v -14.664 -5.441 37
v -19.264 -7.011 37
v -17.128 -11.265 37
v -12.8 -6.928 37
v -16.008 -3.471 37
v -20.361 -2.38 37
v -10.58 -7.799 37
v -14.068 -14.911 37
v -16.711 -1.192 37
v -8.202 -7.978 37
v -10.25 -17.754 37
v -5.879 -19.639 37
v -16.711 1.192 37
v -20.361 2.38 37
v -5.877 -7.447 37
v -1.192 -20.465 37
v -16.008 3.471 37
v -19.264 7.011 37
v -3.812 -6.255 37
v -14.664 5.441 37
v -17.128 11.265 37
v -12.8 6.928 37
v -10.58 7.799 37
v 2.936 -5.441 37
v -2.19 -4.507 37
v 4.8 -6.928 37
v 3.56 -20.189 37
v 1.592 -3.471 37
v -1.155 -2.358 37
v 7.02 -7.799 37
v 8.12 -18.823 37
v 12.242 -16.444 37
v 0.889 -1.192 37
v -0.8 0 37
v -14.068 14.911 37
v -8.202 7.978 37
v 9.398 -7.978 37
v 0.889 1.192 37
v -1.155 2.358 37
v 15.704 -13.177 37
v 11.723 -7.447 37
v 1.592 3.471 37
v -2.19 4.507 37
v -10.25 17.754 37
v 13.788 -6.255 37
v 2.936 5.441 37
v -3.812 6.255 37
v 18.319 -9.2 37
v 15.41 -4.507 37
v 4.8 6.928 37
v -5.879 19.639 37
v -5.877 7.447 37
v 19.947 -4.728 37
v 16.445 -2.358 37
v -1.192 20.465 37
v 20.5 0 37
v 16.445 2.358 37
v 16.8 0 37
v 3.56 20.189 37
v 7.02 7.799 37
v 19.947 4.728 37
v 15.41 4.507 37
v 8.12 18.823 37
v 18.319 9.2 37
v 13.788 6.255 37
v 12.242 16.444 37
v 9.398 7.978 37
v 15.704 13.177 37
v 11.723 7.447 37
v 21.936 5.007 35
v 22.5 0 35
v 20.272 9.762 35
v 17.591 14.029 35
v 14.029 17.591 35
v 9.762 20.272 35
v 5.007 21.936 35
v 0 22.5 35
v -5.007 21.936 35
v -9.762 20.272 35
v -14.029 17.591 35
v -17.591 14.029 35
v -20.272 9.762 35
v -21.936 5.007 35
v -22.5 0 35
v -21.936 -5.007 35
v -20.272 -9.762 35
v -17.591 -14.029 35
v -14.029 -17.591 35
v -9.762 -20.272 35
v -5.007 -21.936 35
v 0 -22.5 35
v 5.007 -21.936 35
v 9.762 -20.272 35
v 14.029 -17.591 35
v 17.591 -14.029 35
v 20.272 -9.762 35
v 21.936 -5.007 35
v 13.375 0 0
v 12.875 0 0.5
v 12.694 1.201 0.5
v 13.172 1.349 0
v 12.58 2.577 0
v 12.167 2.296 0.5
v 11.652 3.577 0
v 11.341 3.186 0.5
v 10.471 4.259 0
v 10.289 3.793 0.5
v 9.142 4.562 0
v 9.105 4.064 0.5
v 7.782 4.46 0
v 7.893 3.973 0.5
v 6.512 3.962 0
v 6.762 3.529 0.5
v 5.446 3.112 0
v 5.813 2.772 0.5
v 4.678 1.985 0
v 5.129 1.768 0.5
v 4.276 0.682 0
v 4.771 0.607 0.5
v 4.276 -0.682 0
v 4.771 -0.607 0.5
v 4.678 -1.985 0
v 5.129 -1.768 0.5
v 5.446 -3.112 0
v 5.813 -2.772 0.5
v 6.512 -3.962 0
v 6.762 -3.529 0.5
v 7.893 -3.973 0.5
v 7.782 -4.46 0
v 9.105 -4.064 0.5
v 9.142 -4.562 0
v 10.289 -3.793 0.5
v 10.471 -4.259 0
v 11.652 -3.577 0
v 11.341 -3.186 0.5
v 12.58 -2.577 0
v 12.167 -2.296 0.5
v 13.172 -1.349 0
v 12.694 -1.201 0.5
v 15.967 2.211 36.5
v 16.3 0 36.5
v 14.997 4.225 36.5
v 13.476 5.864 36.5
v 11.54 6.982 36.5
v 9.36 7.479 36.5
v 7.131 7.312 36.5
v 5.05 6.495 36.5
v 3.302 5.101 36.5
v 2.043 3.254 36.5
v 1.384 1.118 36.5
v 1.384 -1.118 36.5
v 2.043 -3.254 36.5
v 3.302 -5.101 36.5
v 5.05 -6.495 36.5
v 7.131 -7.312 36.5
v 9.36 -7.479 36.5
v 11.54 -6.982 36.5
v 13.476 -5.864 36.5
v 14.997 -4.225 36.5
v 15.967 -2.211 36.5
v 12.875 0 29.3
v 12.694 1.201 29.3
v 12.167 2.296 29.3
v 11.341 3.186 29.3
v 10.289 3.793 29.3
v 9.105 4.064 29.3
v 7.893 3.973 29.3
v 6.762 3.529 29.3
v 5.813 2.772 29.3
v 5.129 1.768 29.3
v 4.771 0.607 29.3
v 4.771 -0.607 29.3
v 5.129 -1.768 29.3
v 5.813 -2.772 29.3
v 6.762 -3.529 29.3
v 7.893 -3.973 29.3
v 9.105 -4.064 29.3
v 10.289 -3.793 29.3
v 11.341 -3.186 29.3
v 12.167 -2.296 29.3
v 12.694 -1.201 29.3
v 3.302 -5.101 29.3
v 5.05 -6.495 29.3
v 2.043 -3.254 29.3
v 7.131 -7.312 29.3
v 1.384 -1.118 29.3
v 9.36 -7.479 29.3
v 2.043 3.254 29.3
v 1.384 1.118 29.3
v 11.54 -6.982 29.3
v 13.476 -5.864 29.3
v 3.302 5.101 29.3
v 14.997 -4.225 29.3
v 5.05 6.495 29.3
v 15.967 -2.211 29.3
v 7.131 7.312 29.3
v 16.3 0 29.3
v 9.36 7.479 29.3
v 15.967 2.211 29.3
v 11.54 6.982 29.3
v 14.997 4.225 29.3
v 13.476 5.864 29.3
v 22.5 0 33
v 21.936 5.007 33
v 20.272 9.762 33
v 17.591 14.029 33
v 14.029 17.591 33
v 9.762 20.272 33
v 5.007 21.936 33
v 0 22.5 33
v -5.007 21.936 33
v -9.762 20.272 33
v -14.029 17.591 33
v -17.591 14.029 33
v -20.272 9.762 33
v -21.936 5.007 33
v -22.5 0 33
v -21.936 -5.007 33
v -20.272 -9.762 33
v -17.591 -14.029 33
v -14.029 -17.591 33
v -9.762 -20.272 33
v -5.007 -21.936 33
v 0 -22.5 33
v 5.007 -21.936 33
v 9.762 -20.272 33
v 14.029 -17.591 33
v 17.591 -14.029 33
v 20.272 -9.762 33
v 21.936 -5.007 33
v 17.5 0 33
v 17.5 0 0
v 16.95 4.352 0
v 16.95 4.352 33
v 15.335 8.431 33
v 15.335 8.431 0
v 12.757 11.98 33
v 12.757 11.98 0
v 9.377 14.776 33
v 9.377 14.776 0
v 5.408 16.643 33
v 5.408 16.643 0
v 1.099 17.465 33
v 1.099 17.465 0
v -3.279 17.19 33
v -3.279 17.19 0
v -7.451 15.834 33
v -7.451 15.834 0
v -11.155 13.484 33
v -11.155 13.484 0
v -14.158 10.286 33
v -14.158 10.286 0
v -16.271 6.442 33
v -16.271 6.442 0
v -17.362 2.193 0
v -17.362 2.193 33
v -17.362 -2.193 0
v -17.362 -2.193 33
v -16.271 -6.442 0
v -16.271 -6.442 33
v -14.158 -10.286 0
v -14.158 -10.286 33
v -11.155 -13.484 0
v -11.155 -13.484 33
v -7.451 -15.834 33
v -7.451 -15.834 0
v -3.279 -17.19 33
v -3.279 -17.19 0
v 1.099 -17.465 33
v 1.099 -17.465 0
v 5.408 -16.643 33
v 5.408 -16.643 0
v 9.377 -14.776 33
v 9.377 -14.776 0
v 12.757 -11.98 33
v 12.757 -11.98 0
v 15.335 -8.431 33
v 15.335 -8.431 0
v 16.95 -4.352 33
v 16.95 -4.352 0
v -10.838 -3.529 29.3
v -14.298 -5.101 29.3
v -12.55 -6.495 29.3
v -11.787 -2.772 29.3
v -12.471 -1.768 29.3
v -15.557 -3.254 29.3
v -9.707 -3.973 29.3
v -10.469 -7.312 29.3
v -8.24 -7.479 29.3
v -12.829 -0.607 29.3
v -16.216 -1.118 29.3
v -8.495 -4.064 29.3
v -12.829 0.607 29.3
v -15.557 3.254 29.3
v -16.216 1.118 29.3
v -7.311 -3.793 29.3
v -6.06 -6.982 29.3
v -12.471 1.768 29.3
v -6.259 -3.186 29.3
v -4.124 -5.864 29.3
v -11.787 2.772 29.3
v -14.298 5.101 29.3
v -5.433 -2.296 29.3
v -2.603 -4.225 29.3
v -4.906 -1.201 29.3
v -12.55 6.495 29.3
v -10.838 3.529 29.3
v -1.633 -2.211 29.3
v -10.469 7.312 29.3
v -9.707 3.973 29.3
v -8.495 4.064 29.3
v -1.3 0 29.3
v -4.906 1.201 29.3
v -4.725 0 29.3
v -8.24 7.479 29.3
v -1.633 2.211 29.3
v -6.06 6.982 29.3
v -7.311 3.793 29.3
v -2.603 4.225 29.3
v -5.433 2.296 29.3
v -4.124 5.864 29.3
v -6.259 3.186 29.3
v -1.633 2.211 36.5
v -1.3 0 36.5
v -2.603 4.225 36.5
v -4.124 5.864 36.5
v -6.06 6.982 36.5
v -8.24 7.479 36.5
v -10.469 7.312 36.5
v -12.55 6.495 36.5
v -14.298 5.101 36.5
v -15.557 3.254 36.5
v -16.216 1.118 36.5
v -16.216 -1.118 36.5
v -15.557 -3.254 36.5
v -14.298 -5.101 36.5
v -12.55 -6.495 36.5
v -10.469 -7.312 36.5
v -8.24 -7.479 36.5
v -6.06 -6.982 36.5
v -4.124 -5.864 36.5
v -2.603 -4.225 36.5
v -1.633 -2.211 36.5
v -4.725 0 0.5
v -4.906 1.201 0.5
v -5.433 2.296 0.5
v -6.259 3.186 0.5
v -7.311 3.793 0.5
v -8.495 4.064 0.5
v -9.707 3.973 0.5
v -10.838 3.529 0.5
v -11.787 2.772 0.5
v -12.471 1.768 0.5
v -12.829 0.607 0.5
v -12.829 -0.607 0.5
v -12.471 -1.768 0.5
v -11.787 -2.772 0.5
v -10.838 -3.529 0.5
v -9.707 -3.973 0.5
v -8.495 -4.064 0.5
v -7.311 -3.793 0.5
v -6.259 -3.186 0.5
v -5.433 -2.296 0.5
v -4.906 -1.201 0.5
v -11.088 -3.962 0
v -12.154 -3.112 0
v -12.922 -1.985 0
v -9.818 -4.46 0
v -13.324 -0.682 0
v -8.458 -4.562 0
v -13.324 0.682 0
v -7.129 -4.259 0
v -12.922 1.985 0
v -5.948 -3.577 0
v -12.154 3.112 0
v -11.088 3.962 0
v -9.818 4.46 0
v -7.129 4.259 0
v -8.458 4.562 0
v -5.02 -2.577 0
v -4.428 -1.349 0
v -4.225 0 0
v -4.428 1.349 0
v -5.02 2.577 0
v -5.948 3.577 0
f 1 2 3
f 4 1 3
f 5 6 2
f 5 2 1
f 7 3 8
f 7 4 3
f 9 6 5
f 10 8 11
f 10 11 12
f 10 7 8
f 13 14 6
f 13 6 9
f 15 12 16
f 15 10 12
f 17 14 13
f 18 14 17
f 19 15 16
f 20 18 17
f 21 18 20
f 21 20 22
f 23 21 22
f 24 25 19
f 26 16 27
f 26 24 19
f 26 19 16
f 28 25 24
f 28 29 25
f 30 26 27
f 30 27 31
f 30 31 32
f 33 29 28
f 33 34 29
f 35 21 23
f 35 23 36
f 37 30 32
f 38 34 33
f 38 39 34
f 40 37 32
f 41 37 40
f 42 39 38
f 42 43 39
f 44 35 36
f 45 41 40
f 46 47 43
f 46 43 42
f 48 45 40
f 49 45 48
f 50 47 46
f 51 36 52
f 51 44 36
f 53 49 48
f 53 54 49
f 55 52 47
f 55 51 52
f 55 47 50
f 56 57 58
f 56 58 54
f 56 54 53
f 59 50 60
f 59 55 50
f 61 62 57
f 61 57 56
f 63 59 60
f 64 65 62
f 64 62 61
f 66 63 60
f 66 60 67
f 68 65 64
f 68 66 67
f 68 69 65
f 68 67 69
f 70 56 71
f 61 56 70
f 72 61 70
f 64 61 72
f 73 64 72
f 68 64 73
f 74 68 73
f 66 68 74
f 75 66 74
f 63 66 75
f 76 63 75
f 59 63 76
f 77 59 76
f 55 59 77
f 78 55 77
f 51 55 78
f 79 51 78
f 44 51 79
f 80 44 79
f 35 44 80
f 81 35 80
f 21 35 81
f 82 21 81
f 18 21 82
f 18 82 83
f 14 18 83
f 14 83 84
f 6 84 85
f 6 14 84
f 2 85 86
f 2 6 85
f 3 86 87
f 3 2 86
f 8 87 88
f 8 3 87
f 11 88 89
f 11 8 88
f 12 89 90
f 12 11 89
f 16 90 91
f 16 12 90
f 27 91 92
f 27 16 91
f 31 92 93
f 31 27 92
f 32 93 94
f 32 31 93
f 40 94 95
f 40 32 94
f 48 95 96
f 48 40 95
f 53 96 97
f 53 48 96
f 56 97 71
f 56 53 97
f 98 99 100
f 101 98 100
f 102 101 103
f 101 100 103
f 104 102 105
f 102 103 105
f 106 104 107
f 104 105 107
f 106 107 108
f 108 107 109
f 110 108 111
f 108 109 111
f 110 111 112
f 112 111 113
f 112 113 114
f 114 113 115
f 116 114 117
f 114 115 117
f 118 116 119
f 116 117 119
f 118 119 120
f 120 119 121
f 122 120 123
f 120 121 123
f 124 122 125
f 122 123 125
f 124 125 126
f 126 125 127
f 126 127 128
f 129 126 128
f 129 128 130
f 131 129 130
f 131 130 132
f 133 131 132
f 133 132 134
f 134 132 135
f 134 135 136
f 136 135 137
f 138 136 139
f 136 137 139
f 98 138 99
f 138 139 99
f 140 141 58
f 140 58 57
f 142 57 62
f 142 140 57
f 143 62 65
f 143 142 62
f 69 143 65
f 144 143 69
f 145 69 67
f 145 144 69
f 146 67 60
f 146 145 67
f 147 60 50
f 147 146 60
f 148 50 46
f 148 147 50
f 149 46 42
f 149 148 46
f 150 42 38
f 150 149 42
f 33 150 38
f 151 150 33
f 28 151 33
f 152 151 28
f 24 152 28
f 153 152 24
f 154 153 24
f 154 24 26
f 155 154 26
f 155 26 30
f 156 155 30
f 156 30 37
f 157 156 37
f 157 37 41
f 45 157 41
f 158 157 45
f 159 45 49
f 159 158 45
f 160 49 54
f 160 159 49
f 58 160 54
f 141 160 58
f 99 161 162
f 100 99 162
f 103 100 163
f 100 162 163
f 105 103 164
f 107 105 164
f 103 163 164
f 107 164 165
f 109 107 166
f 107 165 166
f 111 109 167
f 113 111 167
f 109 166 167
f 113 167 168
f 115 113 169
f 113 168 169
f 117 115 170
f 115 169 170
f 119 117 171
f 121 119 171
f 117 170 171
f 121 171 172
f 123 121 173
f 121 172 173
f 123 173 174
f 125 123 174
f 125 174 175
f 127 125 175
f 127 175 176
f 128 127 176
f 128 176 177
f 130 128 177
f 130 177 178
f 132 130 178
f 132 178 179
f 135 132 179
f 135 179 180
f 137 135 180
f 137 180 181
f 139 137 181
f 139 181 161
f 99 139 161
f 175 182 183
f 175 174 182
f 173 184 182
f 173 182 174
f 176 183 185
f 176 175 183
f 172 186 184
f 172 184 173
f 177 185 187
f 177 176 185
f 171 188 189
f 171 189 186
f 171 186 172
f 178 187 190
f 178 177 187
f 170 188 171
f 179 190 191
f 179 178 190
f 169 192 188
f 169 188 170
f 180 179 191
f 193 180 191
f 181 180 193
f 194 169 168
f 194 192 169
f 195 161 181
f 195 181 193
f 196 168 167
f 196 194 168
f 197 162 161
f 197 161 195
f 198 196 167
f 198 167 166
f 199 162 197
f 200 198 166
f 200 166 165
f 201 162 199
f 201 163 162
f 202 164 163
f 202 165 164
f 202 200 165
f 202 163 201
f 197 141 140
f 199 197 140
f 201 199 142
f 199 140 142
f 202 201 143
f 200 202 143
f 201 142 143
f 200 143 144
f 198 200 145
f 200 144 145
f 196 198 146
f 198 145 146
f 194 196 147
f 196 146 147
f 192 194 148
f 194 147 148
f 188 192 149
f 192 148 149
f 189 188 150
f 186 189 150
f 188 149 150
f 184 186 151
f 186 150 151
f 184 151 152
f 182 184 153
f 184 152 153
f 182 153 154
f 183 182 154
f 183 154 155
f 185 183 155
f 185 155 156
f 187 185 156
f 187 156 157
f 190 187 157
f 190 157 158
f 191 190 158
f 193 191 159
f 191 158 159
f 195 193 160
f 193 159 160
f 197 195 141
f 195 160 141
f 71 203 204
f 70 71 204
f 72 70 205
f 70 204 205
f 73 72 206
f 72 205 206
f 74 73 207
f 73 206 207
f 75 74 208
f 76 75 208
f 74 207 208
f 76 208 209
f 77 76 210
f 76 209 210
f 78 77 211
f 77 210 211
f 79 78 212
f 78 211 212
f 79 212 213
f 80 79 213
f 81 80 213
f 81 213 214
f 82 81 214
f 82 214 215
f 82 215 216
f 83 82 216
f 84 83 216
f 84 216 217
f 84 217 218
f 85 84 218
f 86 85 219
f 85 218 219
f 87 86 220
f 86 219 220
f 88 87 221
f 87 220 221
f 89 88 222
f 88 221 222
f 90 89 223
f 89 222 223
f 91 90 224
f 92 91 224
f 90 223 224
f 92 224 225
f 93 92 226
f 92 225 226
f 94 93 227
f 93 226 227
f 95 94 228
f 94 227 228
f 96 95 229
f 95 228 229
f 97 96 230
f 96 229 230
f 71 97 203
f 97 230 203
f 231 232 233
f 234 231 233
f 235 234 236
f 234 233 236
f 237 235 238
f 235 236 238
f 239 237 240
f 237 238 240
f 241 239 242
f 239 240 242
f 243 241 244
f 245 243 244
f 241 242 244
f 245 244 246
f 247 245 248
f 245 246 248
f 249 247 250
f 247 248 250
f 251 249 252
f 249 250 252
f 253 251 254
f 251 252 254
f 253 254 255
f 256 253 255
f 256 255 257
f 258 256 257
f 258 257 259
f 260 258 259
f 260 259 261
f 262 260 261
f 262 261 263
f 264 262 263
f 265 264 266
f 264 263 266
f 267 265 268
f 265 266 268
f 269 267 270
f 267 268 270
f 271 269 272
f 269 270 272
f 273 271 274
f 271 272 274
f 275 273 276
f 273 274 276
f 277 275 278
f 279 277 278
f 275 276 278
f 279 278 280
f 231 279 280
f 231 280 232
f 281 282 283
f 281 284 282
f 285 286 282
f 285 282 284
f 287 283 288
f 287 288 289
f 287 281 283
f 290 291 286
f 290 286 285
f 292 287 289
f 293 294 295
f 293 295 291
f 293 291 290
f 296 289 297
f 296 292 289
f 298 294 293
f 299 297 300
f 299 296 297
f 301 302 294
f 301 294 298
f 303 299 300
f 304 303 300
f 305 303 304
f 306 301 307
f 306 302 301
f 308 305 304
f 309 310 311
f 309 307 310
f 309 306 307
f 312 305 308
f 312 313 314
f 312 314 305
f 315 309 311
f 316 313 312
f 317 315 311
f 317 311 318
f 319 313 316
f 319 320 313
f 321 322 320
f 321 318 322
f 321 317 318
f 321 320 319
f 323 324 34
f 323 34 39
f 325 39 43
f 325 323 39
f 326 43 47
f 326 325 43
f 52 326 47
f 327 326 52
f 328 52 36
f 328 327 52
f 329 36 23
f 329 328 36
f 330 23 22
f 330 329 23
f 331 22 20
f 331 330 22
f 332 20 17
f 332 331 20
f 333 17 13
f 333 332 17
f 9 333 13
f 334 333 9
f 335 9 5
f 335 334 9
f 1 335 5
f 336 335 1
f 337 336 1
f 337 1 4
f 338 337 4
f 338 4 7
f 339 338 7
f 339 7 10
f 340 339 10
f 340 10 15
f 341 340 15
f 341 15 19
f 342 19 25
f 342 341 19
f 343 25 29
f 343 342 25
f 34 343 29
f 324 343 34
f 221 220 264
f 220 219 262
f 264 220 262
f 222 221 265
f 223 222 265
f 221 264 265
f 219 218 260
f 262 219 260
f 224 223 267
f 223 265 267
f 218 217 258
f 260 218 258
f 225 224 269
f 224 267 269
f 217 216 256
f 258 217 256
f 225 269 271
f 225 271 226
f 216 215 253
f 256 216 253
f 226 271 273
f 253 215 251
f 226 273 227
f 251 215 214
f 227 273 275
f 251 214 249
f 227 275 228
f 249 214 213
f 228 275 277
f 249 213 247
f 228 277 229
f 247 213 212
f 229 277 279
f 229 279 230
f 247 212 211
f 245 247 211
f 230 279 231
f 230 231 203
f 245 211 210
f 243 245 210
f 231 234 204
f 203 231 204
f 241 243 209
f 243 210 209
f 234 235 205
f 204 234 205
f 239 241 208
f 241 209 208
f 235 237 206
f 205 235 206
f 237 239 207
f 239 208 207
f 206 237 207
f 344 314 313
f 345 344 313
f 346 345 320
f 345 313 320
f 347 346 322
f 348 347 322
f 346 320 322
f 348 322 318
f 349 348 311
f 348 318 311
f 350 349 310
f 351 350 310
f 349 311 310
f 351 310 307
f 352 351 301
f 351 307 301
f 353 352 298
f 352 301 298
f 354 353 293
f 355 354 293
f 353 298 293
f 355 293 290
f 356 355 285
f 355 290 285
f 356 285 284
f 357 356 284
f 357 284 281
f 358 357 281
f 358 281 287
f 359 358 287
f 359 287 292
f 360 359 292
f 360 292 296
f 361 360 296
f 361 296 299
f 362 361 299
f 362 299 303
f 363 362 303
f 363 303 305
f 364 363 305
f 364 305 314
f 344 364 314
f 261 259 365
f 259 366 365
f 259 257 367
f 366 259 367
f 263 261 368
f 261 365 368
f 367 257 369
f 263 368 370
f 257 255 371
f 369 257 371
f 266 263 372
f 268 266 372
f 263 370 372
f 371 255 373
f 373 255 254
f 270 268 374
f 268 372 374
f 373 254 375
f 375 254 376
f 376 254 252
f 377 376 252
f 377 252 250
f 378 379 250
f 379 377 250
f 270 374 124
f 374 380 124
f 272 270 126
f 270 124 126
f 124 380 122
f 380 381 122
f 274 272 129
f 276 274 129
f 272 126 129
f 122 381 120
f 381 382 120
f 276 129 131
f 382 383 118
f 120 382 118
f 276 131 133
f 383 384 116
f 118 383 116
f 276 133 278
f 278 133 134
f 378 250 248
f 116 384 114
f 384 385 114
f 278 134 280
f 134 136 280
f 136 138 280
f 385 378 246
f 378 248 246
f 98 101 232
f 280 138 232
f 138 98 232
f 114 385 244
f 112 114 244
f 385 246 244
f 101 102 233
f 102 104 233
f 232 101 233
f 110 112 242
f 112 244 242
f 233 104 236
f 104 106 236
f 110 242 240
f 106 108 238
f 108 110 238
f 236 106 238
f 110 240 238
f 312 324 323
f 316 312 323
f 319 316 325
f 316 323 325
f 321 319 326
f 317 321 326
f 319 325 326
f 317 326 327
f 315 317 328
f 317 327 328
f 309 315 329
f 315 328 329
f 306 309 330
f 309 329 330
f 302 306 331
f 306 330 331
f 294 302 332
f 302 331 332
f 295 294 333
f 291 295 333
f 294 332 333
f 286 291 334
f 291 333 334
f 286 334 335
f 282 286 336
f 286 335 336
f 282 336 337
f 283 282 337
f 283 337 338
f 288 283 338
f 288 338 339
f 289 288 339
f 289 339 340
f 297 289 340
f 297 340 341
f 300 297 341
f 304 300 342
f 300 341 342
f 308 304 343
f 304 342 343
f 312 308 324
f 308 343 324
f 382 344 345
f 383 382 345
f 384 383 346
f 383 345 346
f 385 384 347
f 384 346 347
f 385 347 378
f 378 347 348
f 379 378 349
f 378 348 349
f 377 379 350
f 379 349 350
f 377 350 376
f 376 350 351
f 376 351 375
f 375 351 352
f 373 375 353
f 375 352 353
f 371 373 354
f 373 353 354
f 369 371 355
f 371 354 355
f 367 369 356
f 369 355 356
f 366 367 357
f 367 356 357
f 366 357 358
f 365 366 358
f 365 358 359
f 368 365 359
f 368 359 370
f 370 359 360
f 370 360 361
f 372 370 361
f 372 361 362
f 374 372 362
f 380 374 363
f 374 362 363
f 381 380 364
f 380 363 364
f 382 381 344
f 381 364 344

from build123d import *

# Parameters (mm, degrees)
F0_R     = 17.5
F1_DEPTH = 33
F2_R     = 22.5
F3_DEPTH = 4
F4_R     = 7.5
F4_R_2   = 4.075
F5_DEPTH = 7.7
F6_DEPTH = 37.001
F7_SIZE  = 2
F8_SIZE  = 0.5


with BuildPart() as f1:
    # F0 (on Top) → F1 (new body)
    with BuildSketch(Plane.XY):
        Circle(F0_R)
    extrude(amount=F1_DEPTH)

    # F2 (on face) → F3 (join)
    with BuildSketch(Plane.XY.offset(33)):
        Circle(F2_R)
    extrude(amount=F3_DEPTH)

    # F4 (on face) → F5 (cut)
    with BuildSketch(Plane.XY.offset(37)):
        with Locations((-8.8, 0)):
            Circle(F4_R)
        with Locations((-8.8, 0)):
            Circle(F4_R_2, mode=Mode.SUBTRACT)
        with Locations((8.8, 0)):
            Circle(F4_R)
        with Locations((8.8, 0)):
            Circle(F4_R_2, mode=Mode.SUBTRACT)
    extrude(amount=-F5_DEPTH, mode=Mode.SUBTRACT)

    # F6 (cut, through all): faces of the model
    f6_faces = [f1.faces().sort_by_distance(p)[0] for p in [
        (-8.8, 0, 37),
        (8.8, 0, 37),
    ]]
    extrude(f6_faces, amount=-F6_DEPTH, mode=Mode.SUBTRACT)

    # F7
    f7_edges = [f1.edges().sort_by_distance(p)[0] for p in [
        (-22.5, 0, 37),
    ]]
    chamfer(f7_edges, length=F7_SIZE)

    # F8
    f8_edges = [f1.edges().sort_by_distance(p)[0] for p in [
        (-16.3, 0, 37),
        (1.3, 0, 37),
        (-12.875, 0, 0),
        (4.725, 0, 0),
    ]]
    chamfer(f8_edges, length=F8_SIZE)


solid = f1.part
